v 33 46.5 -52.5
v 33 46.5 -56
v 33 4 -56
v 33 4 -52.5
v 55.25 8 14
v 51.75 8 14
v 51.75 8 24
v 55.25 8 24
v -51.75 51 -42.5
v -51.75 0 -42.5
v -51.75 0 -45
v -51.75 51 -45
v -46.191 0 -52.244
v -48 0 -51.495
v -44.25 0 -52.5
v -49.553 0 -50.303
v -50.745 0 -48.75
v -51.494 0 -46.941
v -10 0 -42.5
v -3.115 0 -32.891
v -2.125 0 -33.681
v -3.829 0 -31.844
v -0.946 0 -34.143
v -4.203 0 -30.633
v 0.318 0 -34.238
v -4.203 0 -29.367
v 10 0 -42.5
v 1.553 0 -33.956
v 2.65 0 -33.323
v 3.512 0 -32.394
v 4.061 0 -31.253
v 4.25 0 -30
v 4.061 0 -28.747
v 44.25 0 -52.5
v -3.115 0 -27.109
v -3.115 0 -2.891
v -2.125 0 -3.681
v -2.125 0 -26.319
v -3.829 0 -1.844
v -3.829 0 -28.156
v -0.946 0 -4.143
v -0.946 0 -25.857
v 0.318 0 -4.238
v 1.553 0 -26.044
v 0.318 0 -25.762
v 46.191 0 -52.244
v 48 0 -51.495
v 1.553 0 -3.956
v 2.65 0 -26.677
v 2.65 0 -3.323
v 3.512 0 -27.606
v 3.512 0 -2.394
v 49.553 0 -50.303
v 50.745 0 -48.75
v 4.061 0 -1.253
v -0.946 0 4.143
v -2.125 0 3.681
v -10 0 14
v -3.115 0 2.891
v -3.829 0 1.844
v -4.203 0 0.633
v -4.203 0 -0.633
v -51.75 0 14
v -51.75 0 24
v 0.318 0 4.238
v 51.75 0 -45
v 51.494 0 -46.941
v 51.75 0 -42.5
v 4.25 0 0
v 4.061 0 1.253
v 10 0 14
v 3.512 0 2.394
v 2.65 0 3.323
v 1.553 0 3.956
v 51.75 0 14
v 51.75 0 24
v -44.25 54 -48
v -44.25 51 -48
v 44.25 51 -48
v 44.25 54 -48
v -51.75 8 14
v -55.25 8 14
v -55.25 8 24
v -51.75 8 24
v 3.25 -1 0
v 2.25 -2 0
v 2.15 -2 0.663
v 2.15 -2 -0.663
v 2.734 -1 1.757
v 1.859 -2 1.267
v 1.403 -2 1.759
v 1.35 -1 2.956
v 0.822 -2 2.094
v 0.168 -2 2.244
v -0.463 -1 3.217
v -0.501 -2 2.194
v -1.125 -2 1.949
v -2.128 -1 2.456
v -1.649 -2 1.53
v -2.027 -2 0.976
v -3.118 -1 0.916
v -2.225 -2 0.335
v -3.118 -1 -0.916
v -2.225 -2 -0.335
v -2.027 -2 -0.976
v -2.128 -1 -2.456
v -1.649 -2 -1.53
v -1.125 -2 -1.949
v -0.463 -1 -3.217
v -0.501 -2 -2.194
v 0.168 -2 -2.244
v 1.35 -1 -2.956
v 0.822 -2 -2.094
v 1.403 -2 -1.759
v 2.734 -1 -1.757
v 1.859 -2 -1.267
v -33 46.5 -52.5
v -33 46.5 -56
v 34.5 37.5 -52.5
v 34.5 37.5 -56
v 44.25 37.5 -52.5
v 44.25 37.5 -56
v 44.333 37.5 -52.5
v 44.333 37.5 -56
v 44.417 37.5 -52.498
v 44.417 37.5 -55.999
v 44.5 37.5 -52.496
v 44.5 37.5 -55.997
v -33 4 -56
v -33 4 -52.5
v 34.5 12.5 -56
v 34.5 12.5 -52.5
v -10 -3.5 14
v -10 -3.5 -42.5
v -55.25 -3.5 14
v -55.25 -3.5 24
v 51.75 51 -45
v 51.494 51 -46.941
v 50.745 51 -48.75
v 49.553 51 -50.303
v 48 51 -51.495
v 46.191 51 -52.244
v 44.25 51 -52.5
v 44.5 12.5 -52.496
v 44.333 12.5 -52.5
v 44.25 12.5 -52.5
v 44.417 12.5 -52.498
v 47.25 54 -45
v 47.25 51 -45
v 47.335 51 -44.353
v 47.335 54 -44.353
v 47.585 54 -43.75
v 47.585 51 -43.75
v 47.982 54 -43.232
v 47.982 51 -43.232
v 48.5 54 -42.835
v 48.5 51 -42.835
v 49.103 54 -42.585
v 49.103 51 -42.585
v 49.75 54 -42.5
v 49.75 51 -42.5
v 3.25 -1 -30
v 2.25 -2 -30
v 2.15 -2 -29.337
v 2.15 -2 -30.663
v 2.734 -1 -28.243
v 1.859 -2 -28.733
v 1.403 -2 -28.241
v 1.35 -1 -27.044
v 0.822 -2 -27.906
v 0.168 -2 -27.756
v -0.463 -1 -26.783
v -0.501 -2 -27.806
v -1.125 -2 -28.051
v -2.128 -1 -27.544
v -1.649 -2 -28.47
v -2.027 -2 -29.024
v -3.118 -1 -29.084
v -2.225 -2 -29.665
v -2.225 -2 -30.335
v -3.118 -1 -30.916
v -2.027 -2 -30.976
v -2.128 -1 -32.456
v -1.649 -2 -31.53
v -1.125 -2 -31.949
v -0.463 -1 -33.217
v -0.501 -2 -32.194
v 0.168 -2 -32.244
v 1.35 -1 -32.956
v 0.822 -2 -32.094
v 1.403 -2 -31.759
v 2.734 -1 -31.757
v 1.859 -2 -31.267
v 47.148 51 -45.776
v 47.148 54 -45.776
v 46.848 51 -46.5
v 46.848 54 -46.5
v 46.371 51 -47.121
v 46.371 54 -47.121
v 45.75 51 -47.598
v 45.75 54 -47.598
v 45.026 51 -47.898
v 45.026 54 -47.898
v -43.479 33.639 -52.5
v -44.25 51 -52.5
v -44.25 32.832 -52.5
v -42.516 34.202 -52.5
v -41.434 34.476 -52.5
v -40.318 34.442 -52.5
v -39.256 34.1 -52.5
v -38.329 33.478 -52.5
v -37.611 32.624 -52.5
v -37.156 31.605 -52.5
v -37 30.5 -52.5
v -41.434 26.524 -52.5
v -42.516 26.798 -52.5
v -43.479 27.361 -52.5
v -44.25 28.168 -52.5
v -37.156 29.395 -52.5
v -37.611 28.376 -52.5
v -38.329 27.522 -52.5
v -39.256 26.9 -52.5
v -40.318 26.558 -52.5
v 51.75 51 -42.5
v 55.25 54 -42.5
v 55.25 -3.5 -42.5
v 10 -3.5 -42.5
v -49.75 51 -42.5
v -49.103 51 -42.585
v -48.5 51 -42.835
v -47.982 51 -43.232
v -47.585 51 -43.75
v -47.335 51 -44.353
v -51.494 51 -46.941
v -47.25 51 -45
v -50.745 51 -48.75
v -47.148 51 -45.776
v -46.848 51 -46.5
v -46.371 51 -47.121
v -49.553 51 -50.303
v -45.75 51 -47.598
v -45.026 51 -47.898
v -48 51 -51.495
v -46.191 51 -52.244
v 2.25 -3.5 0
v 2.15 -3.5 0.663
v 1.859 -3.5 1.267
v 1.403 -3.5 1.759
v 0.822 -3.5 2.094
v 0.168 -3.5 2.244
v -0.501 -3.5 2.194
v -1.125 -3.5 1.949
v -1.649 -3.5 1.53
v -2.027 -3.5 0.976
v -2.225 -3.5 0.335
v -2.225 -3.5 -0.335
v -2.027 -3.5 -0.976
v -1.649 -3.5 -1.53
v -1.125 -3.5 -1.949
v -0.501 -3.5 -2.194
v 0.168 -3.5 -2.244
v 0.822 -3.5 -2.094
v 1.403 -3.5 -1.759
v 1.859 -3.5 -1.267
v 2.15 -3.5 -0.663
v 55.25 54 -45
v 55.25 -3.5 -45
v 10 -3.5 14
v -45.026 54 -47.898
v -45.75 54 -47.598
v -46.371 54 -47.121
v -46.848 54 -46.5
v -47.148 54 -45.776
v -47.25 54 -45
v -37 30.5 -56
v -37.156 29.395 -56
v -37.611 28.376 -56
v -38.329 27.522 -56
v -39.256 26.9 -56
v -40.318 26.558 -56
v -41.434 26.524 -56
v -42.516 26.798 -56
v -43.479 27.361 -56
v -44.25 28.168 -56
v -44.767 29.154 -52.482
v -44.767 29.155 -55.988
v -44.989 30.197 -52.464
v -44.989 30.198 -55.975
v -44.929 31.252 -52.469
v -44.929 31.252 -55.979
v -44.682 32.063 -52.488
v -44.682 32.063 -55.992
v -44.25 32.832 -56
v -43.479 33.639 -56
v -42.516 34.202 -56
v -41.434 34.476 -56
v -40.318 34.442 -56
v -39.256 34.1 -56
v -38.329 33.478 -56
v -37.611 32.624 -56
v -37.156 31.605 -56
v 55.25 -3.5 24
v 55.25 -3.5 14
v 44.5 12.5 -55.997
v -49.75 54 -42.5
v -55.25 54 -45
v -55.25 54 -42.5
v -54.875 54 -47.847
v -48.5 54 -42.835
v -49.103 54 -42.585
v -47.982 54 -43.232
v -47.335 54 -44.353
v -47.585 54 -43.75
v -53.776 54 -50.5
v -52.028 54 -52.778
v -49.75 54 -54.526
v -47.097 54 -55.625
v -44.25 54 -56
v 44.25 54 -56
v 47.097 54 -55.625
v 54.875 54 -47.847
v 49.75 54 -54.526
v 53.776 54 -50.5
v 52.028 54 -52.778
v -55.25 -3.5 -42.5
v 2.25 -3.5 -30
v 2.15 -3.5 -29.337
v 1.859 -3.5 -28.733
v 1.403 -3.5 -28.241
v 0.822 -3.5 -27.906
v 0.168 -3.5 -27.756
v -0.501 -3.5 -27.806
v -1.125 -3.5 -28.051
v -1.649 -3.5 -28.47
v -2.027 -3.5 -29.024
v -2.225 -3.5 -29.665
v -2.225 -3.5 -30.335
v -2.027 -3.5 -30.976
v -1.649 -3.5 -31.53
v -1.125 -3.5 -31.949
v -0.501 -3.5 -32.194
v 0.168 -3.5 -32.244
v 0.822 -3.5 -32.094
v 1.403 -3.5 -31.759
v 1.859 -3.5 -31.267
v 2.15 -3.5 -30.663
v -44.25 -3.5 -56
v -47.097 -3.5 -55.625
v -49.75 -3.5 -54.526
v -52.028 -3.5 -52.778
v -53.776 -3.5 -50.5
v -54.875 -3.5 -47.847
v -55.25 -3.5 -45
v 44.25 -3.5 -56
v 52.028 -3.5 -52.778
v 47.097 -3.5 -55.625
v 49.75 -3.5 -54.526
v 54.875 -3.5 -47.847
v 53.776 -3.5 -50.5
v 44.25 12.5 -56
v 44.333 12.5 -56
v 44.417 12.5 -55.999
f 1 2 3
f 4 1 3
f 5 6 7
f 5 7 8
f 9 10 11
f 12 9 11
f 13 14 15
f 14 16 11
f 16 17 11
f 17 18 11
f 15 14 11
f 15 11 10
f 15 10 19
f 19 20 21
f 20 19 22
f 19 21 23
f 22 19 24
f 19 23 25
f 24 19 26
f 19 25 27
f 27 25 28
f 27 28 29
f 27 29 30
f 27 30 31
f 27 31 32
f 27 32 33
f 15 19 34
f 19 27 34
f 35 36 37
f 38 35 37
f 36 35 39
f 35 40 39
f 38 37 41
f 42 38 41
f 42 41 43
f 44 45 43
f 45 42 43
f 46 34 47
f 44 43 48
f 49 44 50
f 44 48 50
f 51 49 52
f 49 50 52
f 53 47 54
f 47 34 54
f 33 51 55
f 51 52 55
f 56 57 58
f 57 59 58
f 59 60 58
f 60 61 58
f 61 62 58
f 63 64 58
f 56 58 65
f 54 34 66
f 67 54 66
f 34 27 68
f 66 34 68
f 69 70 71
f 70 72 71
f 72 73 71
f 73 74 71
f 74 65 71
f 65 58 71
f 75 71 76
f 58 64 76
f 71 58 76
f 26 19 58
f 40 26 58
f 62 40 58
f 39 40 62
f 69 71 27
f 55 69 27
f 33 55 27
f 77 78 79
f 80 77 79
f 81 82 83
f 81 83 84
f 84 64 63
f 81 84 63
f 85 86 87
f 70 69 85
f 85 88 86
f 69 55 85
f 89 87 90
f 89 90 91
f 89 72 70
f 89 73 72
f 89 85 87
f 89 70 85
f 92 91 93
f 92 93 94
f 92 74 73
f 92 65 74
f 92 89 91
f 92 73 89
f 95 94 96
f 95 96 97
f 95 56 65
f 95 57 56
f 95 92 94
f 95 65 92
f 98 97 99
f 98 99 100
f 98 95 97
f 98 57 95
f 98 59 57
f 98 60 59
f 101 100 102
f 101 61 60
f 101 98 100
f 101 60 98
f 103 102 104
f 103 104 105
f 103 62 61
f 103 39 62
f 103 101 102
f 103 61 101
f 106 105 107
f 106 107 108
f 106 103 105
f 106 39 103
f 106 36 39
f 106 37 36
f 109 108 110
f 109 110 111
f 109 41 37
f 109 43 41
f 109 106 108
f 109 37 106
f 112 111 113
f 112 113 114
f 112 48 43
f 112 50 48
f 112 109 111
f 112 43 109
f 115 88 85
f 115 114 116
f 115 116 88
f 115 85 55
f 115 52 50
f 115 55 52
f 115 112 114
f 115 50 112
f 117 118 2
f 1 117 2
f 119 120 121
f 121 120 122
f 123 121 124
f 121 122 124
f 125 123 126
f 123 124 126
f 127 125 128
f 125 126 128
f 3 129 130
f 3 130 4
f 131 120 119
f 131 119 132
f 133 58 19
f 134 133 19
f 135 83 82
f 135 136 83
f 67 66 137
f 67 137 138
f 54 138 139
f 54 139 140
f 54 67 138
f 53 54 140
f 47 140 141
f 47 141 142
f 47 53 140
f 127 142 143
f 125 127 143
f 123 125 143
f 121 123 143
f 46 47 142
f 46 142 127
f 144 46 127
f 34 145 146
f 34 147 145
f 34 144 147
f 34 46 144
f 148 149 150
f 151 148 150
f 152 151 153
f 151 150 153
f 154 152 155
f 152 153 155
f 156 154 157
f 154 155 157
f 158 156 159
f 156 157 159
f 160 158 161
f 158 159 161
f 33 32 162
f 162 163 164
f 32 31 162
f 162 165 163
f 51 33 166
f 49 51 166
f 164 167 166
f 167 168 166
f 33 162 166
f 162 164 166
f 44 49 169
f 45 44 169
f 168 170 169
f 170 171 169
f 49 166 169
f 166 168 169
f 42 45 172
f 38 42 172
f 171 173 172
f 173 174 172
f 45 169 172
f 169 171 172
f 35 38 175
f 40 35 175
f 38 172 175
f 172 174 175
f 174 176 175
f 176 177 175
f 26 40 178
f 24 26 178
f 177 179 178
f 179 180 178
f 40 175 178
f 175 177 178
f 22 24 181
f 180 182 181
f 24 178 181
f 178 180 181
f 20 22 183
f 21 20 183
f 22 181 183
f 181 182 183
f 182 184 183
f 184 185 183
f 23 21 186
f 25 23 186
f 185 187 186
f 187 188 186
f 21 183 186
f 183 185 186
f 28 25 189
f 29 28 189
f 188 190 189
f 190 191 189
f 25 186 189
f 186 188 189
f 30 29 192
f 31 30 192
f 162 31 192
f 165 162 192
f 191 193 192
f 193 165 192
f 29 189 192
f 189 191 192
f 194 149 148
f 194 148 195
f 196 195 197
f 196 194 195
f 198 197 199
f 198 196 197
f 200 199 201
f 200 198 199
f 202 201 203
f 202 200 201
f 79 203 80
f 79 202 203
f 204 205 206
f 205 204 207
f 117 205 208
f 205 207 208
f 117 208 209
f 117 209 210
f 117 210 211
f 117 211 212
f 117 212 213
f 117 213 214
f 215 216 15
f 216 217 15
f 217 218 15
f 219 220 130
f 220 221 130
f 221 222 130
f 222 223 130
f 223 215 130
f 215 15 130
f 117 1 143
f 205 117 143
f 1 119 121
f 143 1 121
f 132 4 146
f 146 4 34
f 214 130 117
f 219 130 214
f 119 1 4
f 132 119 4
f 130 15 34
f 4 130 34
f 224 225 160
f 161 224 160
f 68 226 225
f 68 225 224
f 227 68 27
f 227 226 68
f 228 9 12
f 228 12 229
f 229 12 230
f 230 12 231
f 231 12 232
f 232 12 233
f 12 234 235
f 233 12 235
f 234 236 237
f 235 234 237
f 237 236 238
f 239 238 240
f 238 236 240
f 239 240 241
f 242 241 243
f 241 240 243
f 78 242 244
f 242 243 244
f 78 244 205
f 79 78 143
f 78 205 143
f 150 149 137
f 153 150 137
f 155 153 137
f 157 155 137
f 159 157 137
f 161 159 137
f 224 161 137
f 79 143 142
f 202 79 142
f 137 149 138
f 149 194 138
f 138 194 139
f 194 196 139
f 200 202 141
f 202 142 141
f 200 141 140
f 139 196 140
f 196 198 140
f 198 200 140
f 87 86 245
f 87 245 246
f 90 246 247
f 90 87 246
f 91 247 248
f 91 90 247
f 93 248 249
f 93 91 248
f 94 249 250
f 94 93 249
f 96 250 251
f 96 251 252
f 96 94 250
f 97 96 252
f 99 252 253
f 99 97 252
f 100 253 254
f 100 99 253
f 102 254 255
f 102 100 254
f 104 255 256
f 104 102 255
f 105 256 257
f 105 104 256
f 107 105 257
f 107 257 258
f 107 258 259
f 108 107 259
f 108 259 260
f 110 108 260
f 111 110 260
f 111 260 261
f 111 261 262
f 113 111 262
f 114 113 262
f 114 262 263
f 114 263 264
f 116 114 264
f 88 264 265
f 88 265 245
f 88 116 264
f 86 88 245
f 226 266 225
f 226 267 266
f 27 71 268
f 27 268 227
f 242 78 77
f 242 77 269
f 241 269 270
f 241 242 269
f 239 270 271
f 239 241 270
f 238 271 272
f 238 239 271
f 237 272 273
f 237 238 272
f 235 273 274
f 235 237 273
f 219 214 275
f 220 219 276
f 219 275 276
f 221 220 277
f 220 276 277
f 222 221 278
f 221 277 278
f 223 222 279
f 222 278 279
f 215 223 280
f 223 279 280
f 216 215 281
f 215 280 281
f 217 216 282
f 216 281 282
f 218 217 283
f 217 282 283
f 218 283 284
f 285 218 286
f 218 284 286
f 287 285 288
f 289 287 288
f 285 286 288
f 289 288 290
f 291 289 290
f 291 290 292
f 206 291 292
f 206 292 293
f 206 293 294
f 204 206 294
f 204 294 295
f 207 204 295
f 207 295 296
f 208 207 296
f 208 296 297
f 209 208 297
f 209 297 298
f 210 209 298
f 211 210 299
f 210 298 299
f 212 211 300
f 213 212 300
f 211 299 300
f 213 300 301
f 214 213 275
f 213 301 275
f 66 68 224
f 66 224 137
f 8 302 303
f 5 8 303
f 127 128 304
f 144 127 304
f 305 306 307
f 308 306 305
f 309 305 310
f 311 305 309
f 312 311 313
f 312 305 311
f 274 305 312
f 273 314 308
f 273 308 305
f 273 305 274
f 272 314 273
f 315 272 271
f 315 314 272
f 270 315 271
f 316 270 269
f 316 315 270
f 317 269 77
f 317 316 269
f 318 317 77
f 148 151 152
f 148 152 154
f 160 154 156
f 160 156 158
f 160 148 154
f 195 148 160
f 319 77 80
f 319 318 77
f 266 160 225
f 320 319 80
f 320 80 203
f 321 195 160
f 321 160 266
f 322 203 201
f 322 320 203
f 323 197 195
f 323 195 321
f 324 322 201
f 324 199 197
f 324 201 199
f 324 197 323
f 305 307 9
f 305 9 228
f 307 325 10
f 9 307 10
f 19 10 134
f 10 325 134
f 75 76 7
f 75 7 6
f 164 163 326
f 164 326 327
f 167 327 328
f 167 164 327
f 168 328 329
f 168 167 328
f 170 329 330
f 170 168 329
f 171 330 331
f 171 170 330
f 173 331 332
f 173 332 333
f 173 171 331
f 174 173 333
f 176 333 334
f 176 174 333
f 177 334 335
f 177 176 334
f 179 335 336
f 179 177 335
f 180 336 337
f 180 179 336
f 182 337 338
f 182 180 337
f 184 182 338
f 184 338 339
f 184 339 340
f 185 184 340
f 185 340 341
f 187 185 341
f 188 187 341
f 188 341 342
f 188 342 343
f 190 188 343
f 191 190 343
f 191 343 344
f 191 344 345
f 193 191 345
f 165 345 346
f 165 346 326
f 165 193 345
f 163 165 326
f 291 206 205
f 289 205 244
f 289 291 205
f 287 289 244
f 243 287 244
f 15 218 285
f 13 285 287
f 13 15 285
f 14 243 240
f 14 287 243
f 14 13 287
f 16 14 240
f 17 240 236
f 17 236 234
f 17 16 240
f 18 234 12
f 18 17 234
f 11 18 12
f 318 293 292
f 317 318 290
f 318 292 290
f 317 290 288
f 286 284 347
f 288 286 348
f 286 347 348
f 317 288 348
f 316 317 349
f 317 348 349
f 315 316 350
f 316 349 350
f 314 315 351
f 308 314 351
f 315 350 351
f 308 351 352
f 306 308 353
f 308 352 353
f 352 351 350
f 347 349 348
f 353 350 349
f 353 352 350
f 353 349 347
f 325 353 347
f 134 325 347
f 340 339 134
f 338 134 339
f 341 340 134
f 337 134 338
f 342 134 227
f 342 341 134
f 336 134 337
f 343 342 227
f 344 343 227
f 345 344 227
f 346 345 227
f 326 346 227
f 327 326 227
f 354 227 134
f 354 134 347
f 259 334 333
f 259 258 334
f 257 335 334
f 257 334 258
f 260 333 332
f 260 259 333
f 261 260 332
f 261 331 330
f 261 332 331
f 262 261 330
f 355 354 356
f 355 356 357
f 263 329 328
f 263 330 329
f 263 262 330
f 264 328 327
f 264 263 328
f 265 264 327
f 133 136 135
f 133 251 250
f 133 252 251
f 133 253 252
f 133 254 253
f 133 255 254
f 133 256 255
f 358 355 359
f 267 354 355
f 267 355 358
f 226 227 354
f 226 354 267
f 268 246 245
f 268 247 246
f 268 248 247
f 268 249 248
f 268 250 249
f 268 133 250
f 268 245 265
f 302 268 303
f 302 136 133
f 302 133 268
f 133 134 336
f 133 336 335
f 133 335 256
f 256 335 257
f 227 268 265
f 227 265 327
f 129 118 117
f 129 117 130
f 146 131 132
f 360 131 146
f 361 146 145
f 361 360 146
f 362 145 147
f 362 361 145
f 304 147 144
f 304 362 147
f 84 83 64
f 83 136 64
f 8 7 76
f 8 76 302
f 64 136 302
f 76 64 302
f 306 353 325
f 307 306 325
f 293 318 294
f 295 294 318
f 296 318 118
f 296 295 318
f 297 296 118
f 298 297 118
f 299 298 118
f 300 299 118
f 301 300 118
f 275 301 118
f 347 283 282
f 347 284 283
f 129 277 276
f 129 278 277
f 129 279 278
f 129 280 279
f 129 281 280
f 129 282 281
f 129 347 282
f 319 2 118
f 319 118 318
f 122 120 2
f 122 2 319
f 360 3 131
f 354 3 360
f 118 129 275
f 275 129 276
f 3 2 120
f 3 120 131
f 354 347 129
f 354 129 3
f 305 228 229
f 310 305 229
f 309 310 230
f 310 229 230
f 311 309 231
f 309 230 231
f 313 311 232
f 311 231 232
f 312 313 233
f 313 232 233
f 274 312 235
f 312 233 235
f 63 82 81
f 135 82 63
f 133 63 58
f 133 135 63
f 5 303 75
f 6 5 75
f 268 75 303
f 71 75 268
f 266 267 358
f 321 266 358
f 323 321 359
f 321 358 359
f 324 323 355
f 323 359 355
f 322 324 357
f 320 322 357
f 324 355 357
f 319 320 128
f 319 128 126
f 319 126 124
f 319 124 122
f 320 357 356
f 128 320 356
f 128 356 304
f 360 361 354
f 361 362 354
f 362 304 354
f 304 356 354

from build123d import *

# Parameters (mm, degrees)
SKETCH067_R     = 2.25
PAD050_DEPTH    = 3.5
PAD051_DEPTH    = 51
PAD052_DEPTH    = 3
CHAMFER005_SIZE = 2
SKETCH070_R     = 4
SKETCH070_W     = 66
SKETCH070_H     = 42.5
SKETCH070_W_2   = 10
SKETCH070_H_2   = 25
POCKET033_DEPTH = 80.001
SKETCH071_W     = 3.5
SKETCH071_H     = 10
PAD053_DEPTH    = 8


with BuildPart() as part:
    # Sketch067 → Pad050 (new body)
    with BuildSketch(Plane.XZ):
        with BuildLine():
            Line((55.25, 24), (-55.25, 24))
            Line((-55.25, 24), (-55.25, 14))
            Line((-55.25, 14), (-10, 14))
            Line((-10, 14), (-10, -42.5))
            Line((-10, -42.5), (-55.25, -42.5))
            Line((-55.25, -42.5), (-55.25, -45))
            ThreePointArc((-55.25, -45), (-52.028175, -52.778175), (-44.25, -56))
            Line((44.25, -56), (-44.25, -56))
            ThreePointArc((44.25, -56), (52.028175, -52.778175), (55.25, -45))
            Line((55.25, -42.5), (55.25, -45))
            Line((10, -42.5), (55.25, -42.5))
            Line((10, 14), (10, -42.5))
            Line((55.25, 14), (10, 14))
            Line((55.25, 24), (55.25, 14))
        make_face()
        Circle(SKETCH067_R, mode=Mode.SUBTRACT)
        with Locations((0, -30)):
            Circle(SKETCH067_R, mode=Mode.SUBTRACT)
    extrude(amount=PAD050_DEPTH)

    # Sketch068 (on Face17 of Pad050) → Pad051 (join)
    with BuildSketch(Plane(origin=(0, 0, 0), x_dir=(1, 0, 0), z_dir=(0, 1, 0))):
        with BuildLine():
            Line((-55.25, 45), (-55.25, 42.5))
            Line((-55.25, 42.5), (-51.75, 42.5))
            Line((-51.75, 42.5), (-51.75, 45))
            ThreePointArc((-44.25, 52.5), (-49.553301, 50.303301), (-51.75, 45))
            Line((-44.25, 52.5), (44.25, 52.5))
            ThreePointArc((51.75, 45), (49.553301, 50.303301), (44.25, 52.5))
            Line((51.75, 42.5), (51.75, 45))
            Line((55.25, 42.5), (51.75, 42.5))
            Line((55.25, 45), (55.25, 42.5))
            ThreePointArc((55.25, 45), (52.028175, 52.778175), (44.25, 56))
            Line((-44.25, 56), (44.25, 56))
            ThreePointArc((-44.25, 56), (-52.028175, 52.778175), (-55.25, 45))
        make_face()
    extrude(amount=PAD051_DEPTH)

    # Sketch069 (on Face17 of Pad051) → Pad052 (join)
    with BuildSketch(Plane(origin=(0, 51, 0), x_dir=(1, 0, 0), z_dir=(0, 1, 0))):
        with BuildLine():
            Line((-55.25, 45), (-55.25, 42.5))
            Line((-55.25, 42.5), (-49.75, 42.5))
            ThreePointArc((-49.75, 42.5), (-47.982233, 43.232233), (-47.25, 45))
            ThreePointArc((-44.25, 48), (-46.37132, 47.12132), (-47.25, 45))
            Line((-44.25, 48), (44.25, 48))
            ThreePointArc((47.25, 45), (46.37132, 47.12132), (44.25, 48))
            ThreePointArc((47.25, 45), (47.982233, 43.232233), (49.75, 42.5))
            Line((55.25, 42.5), (49.75, 42.5))
            Line((55.25, 45), (55.25, 42.5))
            ThreePointArc((55.25, 45), (52.028175, 52.778175), (44.25, 56))
            Line((-44.25, 56), (44.25, 56))
            ThreePointArc((-44.25, 56), (-52.028175, 52.778175), (-55.25, 45))
        make_face()
    extrude(amount=PAD052_DEPTH)

    # Chamfer005
    chamfer005_edges = [part.edges().sort_by_distance(p)[0] for p in [
        (-2.25, 0, -30),
        (-2.25, 0, 0),
    ]]
    chamfer(chamfer005_edges, length=CHAMFER005_SIZE)

    # Sketch070 (on Face28 of Chamfer005) → Pocket033 (cut, through all)
    with BuildSketch(Plane(origin=(0, 0, -56), x_dir=(1, 0, 0), z_dir=(0, 0, -1))):
        with Locations((-41, -30.5)):
            Circle(SKETCH070_R)
        with Locations((0, -25.25)):
            Rectangle(SKETCH070_W, SKETCH070_H)
        with Locations((39.5, -25)):
            Rectangle(SKETCH070_W_2, SKETCH070_H_2)
    extrude(amount=-POCKET033_DEPTH, mode=Mode.SUBTRACT)

    # Sketch071 (on Face4 of Pad051) → Pad053 (join)
    with BuildSketch(Plane(origin=(0, 0, 0), x_dir=(1, 0, 0), z_dir=(0, 1, 0))):
        with Locations((-53.5, -19)):
            Rectangle(SKETCH071_W, SKETCH071_H)
        with Locations((53.5, -19)):
            Rectangle(SKETCH071_W, SKETCH071_H)
    extrude(amount=PAD053_DEPTH)


solid = part.part
